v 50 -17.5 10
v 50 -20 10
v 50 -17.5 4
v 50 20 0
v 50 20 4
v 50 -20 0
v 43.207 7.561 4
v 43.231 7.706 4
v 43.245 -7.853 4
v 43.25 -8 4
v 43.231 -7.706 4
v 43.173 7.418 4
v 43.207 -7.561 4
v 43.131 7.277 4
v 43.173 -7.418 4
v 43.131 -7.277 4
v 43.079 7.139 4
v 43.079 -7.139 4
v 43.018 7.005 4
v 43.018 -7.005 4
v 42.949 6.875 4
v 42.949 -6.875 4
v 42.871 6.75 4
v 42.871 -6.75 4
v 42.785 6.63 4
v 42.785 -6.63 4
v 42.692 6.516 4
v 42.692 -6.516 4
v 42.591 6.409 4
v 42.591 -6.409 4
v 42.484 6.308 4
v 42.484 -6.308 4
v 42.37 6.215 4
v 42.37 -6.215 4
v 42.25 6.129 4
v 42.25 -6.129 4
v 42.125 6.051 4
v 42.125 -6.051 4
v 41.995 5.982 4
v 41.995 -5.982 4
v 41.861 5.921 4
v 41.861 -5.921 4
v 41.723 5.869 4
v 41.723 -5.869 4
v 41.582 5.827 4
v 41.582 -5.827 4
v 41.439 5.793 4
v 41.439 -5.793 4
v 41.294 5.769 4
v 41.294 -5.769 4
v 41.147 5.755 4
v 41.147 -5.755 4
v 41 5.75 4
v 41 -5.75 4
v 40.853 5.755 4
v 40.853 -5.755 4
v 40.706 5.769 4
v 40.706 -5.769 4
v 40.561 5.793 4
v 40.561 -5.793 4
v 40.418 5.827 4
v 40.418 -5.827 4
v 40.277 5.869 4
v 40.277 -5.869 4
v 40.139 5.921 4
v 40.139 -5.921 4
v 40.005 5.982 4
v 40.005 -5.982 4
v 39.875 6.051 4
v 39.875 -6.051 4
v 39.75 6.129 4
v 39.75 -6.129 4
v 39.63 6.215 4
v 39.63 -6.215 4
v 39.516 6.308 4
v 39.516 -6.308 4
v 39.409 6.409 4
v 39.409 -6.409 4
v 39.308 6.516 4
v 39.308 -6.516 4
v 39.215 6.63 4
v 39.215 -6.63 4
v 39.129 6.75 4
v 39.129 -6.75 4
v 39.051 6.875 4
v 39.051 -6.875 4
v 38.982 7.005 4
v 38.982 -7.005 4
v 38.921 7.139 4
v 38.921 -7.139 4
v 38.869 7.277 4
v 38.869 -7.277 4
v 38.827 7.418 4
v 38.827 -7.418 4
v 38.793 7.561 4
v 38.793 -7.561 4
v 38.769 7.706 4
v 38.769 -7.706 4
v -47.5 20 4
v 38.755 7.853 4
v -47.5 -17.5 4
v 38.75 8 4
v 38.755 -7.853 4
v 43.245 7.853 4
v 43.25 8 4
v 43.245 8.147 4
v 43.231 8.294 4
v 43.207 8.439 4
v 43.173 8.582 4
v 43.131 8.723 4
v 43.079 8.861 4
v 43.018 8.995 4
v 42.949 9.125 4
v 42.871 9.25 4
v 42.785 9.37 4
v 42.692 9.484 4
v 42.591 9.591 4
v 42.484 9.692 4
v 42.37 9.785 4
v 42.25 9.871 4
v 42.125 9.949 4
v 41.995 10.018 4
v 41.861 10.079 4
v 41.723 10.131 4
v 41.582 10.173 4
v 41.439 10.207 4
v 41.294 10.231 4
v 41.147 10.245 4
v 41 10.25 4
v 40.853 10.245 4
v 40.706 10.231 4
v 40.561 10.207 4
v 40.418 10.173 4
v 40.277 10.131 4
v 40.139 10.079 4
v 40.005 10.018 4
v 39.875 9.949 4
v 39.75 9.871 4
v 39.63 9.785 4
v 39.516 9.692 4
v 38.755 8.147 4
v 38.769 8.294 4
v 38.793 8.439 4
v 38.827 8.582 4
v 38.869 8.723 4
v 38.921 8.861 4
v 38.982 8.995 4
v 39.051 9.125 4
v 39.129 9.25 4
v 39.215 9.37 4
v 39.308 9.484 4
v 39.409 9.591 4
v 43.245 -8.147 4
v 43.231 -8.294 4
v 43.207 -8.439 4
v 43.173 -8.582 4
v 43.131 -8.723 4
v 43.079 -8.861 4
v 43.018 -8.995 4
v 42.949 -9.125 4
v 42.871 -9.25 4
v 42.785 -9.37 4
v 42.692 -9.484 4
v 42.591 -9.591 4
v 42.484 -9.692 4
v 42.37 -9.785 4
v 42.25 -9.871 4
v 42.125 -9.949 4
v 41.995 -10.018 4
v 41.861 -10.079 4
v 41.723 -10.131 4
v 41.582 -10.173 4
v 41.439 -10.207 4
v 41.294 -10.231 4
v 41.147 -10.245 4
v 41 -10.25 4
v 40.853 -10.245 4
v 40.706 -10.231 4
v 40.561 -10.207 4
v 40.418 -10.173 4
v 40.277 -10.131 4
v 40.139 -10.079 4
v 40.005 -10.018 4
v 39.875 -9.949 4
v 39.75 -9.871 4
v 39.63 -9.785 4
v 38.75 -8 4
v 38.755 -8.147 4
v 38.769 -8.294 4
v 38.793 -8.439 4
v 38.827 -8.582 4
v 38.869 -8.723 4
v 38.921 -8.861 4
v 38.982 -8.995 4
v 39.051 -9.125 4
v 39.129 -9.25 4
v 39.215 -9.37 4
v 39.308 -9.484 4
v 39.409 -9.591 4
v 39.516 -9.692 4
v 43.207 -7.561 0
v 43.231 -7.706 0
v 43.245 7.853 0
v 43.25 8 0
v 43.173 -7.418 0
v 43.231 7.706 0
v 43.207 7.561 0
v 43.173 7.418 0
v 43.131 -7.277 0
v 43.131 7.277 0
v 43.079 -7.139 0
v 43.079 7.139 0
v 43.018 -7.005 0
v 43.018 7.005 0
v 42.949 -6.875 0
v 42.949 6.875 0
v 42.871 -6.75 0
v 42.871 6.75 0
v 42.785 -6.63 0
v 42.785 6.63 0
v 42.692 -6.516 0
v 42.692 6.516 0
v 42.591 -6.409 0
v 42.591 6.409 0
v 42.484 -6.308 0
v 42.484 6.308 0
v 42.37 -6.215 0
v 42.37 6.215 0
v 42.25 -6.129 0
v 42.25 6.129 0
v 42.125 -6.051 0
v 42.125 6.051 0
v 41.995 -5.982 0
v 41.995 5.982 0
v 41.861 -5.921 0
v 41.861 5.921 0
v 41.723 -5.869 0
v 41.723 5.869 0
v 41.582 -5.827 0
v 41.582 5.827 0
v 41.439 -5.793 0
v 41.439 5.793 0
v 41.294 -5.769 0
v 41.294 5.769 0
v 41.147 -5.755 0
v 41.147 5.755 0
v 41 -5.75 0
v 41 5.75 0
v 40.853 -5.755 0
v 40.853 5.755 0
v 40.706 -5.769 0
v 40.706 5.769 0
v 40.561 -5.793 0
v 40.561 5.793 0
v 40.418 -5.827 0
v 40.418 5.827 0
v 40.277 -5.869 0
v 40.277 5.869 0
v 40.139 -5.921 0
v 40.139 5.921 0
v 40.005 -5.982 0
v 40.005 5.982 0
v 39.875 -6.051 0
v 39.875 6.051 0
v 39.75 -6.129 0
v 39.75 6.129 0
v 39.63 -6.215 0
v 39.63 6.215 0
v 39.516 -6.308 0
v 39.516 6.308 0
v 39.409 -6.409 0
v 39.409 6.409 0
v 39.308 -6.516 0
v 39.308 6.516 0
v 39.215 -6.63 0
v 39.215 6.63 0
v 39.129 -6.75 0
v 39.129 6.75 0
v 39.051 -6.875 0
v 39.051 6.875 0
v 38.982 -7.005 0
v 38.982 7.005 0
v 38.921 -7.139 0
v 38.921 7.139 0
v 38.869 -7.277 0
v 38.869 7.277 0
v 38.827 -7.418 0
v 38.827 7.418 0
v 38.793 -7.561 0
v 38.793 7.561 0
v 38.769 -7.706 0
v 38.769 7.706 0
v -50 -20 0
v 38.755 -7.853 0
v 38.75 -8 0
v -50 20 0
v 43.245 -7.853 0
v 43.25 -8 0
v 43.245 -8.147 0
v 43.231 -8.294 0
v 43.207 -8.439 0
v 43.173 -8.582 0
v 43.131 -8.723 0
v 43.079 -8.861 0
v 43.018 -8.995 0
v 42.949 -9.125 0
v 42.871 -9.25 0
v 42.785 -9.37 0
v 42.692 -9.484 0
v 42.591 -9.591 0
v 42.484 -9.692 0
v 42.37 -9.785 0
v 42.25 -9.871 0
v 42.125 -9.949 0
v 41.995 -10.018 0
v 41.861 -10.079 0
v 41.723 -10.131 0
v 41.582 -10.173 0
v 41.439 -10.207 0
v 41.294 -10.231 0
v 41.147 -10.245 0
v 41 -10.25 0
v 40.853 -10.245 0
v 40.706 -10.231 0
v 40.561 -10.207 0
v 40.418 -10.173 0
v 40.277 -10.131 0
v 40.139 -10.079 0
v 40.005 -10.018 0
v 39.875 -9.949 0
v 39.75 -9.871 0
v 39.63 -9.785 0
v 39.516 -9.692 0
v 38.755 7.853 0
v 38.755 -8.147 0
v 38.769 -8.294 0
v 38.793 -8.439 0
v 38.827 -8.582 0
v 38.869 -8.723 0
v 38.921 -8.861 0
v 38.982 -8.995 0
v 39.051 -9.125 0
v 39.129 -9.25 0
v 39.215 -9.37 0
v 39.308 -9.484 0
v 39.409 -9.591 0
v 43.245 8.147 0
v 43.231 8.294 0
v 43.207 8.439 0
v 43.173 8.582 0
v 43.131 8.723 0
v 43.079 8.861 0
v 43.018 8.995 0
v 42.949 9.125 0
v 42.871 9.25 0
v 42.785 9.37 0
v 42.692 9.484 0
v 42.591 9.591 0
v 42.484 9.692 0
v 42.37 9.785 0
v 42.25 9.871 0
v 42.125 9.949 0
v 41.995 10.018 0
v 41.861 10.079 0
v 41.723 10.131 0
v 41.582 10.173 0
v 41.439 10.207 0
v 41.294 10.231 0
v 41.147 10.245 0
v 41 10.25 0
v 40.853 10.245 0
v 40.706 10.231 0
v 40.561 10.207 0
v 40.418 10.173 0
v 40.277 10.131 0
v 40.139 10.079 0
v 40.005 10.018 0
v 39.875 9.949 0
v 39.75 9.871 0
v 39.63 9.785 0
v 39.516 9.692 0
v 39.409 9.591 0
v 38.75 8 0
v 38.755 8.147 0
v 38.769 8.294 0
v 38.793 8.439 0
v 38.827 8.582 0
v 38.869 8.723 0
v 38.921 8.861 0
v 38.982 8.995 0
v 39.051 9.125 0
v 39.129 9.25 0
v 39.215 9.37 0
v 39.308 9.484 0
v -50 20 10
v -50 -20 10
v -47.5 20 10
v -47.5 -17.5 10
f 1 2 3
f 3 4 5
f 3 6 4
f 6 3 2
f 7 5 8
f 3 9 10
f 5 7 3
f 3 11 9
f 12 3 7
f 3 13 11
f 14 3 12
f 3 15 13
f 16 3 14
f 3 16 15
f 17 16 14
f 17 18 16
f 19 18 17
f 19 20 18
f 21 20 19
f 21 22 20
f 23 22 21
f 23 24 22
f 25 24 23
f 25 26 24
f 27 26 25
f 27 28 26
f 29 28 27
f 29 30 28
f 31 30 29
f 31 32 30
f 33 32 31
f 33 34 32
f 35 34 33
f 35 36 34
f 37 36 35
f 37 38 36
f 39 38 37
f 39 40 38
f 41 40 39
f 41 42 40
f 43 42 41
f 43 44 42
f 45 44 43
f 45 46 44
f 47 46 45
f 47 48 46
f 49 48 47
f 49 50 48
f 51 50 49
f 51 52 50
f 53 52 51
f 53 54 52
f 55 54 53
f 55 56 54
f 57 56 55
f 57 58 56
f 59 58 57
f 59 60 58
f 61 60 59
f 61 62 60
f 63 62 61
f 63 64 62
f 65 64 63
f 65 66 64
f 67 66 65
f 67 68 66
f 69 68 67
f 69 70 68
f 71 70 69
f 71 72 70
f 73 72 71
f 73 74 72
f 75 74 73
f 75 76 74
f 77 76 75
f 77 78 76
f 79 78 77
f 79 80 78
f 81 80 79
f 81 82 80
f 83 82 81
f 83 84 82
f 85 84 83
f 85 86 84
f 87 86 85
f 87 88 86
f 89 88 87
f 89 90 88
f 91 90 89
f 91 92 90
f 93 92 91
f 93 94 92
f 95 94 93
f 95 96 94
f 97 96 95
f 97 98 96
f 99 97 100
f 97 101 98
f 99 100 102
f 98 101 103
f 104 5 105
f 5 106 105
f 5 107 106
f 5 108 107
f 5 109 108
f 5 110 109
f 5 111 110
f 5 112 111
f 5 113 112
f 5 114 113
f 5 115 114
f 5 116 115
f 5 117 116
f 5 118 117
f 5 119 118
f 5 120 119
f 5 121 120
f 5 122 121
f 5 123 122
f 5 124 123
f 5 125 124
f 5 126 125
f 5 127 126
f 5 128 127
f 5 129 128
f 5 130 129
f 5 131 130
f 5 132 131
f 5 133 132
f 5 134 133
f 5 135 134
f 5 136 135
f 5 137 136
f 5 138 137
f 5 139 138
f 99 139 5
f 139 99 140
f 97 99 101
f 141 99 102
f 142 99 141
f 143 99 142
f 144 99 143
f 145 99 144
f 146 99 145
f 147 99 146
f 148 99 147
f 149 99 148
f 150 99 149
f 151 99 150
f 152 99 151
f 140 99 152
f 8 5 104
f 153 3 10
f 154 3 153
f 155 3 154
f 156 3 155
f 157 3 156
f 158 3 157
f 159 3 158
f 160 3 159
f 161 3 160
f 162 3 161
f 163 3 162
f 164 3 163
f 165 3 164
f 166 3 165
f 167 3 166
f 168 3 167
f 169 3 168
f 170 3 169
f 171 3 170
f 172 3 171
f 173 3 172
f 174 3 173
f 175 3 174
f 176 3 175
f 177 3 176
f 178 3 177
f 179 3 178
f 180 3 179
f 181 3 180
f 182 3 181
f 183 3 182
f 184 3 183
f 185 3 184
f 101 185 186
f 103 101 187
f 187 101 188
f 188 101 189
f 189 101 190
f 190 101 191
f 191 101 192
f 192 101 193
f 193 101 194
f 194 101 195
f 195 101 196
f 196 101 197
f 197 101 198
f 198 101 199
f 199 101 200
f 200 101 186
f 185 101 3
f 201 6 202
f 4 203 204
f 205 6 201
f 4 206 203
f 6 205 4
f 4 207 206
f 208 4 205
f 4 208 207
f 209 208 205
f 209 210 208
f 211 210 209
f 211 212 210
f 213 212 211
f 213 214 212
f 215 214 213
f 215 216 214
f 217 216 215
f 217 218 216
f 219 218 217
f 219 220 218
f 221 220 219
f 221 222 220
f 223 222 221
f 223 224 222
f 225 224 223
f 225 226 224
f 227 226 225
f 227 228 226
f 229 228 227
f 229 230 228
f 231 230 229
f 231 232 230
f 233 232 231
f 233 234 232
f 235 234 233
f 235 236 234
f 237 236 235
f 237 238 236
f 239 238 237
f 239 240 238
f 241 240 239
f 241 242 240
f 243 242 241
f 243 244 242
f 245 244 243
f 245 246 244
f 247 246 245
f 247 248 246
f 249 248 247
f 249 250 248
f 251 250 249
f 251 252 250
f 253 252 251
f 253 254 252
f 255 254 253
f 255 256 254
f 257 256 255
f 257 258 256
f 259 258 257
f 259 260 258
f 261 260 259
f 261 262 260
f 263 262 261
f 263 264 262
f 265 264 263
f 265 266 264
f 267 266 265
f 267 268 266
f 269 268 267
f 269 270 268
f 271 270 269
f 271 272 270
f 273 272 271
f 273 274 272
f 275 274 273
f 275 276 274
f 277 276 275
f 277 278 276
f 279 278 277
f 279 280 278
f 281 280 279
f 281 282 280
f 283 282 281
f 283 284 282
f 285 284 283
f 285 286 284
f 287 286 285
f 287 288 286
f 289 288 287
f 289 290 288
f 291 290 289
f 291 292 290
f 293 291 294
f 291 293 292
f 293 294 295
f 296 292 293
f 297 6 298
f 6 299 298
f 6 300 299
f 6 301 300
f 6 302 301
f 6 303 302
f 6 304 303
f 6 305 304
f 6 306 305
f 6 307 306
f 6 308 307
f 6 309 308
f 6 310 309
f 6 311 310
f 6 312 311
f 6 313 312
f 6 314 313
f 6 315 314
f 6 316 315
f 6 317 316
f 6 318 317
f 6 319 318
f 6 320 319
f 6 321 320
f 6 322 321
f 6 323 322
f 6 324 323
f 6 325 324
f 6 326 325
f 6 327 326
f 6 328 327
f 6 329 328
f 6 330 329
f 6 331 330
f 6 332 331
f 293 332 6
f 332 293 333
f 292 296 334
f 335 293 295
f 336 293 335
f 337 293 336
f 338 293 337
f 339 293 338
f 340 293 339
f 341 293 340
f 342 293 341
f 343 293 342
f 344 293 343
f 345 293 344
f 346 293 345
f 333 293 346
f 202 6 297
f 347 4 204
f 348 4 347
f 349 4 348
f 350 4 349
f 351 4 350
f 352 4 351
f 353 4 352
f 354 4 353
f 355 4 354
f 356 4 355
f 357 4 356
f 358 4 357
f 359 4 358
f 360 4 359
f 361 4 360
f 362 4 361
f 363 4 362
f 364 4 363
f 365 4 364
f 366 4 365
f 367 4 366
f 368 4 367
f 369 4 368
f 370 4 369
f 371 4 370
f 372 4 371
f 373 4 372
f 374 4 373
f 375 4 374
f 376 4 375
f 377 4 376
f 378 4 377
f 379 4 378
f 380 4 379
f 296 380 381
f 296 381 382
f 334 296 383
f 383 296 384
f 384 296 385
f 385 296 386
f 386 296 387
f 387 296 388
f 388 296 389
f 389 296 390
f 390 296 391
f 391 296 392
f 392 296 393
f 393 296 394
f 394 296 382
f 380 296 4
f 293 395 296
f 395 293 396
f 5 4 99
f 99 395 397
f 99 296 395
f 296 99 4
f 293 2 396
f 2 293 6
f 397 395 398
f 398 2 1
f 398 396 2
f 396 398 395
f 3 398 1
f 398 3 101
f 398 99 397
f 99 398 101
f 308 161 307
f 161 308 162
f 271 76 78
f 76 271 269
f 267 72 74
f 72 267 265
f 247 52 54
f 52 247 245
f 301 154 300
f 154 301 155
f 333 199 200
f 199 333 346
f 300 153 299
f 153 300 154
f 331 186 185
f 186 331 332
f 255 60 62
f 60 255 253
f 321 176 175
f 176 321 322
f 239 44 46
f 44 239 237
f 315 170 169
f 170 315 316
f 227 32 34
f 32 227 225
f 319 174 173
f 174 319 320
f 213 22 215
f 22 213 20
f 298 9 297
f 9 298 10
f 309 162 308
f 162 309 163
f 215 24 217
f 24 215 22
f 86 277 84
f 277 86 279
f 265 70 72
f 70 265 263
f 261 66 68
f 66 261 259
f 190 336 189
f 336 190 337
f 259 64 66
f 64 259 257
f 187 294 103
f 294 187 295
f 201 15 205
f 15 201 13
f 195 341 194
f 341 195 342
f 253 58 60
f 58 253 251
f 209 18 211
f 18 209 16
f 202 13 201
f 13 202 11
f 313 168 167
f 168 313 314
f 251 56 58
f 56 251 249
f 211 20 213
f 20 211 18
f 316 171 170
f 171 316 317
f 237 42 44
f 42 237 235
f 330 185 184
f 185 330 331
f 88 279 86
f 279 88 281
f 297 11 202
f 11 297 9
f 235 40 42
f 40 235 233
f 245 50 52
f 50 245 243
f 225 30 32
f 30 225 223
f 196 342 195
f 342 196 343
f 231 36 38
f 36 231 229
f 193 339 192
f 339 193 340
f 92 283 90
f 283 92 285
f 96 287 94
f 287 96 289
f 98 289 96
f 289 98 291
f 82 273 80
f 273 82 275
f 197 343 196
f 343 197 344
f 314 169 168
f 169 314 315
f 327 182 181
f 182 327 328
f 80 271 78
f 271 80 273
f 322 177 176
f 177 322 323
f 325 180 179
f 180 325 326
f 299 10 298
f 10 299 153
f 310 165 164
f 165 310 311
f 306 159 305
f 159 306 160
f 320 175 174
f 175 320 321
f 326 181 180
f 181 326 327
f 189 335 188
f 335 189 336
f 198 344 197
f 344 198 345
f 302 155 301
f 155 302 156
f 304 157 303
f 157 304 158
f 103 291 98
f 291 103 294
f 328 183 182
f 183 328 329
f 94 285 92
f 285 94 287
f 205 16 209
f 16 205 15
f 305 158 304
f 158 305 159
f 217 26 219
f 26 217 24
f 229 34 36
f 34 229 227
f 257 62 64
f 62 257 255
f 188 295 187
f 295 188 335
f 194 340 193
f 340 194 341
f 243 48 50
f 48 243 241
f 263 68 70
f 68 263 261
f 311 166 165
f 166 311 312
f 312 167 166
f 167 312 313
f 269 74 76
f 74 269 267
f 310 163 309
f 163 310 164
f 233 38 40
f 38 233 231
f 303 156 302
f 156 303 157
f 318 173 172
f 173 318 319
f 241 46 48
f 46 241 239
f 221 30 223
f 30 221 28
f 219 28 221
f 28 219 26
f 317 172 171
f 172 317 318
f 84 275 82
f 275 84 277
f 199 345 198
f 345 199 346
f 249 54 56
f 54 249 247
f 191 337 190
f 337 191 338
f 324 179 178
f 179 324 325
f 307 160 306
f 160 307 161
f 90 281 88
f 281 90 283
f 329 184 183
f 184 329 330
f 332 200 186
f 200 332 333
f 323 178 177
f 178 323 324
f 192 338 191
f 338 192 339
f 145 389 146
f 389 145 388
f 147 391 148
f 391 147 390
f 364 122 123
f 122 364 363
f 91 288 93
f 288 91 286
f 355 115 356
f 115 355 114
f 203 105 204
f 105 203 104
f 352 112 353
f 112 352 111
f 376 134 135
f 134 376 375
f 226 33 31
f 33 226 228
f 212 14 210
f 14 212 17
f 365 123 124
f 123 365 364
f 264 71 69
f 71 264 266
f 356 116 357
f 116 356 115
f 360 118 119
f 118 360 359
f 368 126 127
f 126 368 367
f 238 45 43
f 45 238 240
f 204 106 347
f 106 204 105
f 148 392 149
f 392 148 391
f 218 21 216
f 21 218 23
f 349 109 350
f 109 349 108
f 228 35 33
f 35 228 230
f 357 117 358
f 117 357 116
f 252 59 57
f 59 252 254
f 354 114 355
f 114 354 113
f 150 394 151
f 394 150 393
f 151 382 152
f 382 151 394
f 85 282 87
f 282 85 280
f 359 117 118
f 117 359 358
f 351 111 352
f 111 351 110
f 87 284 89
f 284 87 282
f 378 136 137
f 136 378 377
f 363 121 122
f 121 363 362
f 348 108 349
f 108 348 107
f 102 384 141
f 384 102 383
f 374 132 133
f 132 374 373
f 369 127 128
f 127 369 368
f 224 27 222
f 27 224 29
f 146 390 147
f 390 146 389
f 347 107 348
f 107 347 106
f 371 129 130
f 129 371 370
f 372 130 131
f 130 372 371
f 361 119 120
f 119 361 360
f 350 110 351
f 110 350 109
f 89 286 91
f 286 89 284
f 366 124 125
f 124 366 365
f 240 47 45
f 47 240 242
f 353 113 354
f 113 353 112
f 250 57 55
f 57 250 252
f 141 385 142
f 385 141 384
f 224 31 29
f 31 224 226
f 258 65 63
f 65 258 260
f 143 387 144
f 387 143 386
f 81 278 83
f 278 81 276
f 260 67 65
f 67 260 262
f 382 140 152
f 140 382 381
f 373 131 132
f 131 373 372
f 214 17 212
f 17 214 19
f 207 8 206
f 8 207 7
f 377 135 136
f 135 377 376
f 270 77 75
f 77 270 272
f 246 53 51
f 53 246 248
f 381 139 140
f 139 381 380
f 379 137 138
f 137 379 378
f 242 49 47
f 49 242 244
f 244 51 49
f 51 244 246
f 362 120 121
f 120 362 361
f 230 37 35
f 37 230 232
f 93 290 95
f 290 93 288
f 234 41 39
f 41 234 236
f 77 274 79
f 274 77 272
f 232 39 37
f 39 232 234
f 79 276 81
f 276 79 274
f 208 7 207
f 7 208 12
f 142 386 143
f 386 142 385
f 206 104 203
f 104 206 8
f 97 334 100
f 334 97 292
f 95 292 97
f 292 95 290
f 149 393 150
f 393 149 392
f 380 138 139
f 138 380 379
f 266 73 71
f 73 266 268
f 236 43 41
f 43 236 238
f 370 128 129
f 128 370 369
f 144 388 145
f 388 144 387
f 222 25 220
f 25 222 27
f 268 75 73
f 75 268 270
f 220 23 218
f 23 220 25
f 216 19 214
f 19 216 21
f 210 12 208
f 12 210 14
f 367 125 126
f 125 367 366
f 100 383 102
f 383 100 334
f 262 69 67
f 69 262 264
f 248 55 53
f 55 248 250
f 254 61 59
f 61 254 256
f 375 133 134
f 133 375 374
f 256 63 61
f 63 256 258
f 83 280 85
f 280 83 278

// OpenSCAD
// Microscope-slide registration jig with two clamp holes
// Category: benchware; Purpose: repeatable origin when photographing a 75 x 25 mm microscope slide.
// Print: FDM, on the broad bottom face at z=0; no support required.
// This is a geometric reference design; no dimensional fit or lab use has been physically validated.
// SPDX-License-Identifier: CERN-OHL-P-2.0

/* [Platform] */
// Overall platform length, X (mm)
base_l = 100; // 0.5
// Overall platform width, Y (mm)
base_w = 40; // 0.5
// Platform thickness (mm)
base_h = 4; // 0.5

/* [Registration Edges] */
// Width of each perpendicular registration rail (mm)
rail_w = 2.5; // 0.1
// Height of rails above print bed (mm)
rail_top = 10; // 0.5

/* [Fasteners] */
// Diameter of each right-side mounting hole (mm)
bore_d = 4.5; // 0.1
// X coordinate of the mounting-hole centers (mm)
bore_x = 41; // 0.5
// Absolute Y coordinate of mounting-hole centers (mm)
bore_y = 8; // 0.5

/* [Hidden] */
$fn = 96;
eps = 0.1;
assert(base_l >= 90 && base_w >= 35);
assert(rail_w >= 1.6 && rail_top >= base_h + 2);
assert(bore_d > 0 && bore_d < 8);
assert(bore_x + bore_d/2 < base_l/2 - 1);
assert(bore_x - bore_d/2 > -base_l/2 + rail_w + 1);
assert(bore_y + bore_d/2 < base_w/2 - 1);
assert(bore_y - bore_d/2 > -base_w/2 + rail_w + 1);
assert(bore_d / 2 + 2 < bore_y);

difference() {
    union() {
        translate([-base_l/2, -base_w/2, 0])
            cube([base_l, base_w, base_h]);
        translate([-base_l/2, -base_w/2, base_h])
            cube([base_l, rail_w, rail_top-base_h]);
        translate([-base_l/2, -base_w/2, base_h])
            cube([rail_w, base_w, rail_top-base_h]);
    }
    for (sign=[-1,1])
        translate([bore_x, sign*bore_y, -eps])
            cylinder(h=base_h+2*eps, d=bore_d);
}
